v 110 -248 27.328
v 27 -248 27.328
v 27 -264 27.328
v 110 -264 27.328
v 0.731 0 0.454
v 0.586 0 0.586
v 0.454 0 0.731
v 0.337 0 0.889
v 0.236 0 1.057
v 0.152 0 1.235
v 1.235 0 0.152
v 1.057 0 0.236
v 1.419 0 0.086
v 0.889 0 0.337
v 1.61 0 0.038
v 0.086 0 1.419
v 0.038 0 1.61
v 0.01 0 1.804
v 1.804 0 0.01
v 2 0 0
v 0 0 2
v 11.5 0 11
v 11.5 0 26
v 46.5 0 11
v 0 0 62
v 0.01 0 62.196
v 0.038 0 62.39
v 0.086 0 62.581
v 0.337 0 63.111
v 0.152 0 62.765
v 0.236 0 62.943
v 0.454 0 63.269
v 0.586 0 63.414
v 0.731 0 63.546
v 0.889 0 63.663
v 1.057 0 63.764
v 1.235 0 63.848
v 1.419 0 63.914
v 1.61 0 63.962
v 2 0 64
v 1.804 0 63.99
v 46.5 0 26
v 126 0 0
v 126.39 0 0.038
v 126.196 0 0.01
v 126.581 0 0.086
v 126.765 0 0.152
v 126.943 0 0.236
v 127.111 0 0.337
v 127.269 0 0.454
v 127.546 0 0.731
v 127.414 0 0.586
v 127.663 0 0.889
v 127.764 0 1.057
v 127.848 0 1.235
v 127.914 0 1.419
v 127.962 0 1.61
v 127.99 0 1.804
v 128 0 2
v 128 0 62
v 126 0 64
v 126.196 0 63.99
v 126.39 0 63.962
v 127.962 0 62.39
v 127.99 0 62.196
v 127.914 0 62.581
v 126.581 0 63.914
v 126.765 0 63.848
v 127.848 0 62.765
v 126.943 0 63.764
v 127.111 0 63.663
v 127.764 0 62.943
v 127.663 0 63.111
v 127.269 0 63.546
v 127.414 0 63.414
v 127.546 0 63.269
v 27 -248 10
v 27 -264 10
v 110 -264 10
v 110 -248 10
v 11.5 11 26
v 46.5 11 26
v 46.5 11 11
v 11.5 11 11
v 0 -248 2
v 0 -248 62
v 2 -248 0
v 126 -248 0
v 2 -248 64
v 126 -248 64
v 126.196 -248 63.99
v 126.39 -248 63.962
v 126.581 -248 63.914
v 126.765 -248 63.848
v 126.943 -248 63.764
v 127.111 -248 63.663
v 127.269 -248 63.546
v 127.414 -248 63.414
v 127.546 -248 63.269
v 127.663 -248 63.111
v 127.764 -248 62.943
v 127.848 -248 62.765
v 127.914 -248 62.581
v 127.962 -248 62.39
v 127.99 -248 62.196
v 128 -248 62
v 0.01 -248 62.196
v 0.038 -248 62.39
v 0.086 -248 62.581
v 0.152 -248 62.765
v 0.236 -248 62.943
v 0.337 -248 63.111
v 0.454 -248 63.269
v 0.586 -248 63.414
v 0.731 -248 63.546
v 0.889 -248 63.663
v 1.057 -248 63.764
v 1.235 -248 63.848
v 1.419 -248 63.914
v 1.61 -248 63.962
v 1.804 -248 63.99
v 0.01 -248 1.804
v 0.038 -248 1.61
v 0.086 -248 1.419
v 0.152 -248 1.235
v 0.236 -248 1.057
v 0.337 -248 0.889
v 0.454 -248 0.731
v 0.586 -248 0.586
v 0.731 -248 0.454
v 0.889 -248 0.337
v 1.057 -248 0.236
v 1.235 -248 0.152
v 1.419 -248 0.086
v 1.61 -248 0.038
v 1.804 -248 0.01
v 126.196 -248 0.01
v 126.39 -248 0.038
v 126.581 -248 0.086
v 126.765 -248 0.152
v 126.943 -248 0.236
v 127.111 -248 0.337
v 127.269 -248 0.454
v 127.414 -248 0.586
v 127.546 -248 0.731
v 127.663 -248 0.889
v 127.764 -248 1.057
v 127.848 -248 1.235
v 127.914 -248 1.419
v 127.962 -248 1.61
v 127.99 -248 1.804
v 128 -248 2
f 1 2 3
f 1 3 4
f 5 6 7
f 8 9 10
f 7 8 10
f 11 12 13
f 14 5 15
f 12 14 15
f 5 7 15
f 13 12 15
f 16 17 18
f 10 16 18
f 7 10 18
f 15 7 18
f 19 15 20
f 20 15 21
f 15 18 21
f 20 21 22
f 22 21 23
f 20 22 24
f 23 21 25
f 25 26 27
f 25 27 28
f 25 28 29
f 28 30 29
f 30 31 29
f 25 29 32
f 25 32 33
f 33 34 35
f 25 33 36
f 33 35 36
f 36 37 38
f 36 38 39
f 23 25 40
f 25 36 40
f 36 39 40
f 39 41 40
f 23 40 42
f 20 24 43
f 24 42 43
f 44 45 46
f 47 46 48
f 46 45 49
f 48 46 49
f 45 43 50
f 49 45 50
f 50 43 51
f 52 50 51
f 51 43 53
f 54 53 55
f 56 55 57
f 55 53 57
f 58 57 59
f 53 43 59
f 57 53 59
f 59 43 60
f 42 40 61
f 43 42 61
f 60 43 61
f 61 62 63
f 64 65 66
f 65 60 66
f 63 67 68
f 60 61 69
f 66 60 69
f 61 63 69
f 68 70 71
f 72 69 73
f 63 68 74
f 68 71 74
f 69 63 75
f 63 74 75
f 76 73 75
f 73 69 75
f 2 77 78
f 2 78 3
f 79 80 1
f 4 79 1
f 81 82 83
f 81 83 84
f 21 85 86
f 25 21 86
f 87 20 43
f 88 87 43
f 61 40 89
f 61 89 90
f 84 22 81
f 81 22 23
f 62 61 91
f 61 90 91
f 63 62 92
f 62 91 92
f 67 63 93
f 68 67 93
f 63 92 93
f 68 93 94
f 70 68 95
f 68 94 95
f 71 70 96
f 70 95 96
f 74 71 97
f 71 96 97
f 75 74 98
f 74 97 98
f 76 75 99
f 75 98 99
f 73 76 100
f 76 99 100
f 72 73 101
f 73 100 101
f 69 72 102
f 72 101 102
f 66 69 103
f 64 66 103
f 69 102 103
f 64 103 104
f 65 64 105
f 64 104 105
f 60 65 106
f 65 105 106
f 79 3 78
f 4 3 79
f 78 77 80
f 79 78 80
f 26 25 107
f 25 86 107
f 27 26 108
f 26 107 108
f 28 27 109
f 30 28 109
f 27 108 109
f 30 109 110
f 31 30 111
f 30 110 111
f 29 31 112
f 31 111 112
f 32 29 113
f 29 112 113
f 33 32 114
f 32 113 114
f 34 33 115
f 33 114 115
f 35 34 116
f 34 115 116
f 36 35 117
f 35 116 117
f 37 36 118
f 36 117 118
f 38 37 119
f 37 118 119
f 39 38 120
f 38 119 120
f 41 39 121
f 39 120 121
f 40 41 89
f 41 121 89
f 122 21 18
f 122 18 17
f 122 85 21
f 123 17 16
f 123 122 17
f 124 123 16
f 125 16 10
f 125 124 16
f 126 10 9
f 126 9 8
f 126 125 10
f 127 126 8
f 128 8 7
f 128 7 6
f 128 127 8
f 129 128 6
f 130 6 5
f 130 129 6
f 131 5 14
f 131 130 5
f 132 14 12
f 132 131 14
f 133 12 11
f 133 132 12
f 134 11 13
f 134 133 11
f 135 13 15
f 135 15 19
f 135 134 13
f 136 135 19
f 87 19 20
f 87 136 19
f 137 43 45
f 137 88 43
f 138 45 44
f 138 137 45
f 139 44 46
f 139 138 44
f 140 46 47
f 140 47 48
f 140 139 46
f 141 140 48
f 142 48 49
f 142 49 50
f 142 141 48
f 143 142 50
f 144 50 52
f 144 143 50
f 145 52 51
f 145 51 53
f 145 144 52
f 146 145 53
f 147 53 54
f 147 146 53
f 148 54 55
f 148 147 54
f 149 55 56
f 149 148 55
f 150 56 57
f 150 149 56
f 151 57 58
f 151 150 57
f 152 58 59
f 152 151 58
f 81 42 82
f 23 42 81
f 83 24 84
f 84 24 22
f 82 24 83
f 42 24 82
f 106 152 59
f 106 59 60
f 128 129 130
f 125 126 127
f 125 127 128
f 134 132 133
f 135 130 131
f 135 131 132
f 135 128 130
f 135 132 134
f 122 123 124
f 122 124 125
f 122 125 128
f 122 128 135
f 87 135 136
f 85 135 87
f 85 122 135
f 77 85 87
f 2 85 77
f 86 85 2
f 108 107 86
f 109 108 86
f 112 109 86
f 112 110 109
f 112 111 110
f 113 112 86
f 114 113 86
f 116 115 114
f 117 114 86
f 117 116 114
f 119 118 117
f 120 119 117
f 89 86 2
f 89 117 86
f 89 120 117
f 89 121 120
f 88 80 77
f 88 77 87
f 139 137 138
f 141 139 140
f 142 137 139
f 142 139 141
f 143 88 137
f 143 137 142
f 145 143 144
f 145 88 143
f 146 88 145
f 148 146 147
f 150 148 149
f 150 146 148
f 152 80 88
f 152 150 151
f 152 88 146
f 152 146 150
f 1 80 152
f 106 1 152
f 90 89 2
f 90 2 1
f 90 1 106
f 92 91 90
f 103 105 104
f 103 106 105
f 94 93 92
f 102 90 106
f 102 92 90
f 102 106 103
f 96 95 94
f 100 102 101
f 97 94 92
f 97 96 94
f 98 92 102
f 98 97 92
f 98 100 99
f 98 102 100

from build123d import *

# Parameters (mm, degrees)
F0_W     = 128
F0_H     = 64
F1_DEPTH = 248
F2_W     = 83
F2_H     = 17.327847
F3_DEPTH = 16
F4_W     = 35
F4_H     = 15
F5_DEPTH = 11
F6_R     = 2


with BuildPart() as f1:
    # F0 (on Front) → F1 (new body)
    with BuildSketch(Plane.XZ):
        with Locations((64, 32)):
            Rectangle(F0_W, F0_H)
    extrude(amount=F1_DEPTH)

    # F2 (on face) → F3 (join)
    with BuildSketch(Plane.XZ.offset(248)):
        with Locations((68.5, 18.663923)):
            Rectangle(F2_W, F2_H)
    extrude(amount=F3_DEPTH)

    # F4 (on face) → F5 (join)
    with BuildSketch(Plane(origin=(0, 0, 0), x_dir=(-1, 0, 0), z_dir=(0, 1, 0))):
        with Locations((-29, 18.5)):
            Rectangle(F4_W, F4_H)
    extrude(amount=F5_DEPTH)

    # F6
    f6_edges = [f1.edges().sort_by_distance(p)[0] for p in [
        (128, -124, 64),
        (128, -124, 0),
        (0, -124, 64),
        (0, -124, 0),
    ]]
    fillet(f6_edges, radius=F6_R)


solid = f1.part
